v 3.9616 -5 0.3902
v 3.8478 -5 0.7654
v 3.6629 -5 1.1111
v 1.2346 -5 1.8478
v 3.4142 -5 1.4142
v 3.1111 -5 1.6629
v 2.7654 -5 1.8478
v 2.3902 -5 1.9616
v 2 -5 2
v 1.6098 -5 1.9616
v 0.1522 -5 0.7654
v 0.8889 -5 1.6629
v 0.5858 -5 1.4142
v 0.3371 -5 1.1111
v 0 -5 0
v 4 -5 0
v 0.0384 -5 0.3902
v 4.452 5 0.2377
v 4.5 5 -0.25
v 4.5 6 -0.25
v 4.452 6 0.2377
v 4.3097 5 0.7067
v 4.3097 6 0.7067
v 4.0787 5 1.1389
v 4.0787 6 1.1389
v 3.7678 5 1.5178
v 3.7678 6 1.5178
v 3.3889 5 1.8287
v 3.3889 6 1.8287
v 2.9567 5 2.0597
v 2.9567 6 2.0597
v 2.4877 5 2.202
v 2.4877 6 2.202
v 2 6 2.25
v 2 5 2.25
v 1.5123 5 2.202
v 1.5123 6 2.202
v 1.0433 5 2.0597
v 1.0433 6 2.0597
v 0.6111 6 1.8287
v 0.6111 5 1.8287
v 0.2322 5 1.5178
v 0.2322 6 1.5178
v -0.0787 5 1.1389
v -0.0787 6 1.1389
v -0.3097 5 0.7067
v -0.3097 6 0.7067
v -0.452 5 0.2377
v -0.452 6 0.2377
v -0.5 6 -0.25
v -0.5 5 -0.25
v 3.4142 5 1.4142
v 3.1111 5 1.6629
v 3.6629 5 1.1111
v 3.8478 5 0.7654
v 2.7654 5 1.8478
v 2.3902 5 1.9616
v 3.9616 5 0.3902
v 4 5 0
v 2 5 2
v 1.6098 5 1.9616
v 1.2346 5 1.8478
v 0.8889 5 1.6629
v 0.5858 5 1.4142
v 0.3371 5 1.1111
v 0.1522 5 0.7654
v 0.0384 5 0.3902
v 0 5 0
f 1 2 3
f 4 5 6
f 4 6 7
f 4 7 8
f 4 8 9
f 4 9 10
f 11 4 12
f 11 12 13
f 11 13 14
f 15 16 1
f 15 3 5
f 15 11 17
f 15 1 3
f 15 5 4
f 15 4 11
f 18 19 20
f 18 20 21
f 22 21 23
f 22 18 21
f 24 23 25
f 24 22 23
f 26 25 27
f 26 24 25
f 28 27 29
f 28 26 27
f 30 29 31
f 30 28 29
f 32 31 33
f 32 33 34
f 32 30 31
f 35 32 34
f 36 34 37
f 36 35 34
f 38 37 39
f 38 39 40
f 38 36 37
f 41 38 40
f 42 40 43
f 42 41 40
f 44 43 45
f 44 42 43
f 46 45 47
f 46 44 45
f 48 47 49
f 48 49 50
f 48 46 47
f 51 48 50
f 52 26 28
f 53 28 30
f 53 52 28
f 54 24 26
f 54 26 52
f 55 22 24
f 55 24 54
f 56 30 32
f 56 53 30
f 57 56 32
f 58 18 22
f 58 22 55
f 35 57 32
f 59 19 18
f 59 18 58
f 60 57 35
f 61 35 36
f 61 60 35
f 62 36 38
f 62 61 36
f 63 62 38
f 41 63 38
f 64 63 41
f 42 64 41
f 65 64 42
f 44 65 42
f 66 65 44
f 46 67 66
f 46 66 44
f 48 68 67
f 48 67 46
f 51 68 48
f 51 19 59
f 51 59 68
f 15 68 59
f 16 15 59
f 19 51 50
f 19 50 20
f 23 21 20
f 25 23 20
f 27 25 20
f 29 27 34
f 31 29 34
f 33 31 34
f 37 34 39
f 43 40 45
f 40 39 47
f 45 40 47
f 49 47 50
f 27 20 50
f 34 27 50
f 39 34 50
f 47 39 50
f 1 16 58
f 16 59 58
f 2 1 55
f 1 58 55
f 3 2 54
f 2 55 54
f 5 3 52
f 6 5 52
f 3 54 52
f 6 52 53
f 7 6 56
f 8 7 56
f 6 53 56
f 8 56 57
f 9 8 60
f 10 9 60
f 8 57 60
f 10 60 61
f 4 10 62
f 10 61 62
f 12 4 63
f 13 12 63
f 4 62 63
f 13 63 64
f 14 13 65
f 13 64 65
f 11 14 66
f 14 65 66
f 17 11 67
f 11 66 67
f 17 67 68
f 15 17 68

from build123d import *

# Parameters (mm, degrees)
EXTRUDE_1_DEPTH = 5
EXTRUDE_2_DEPTH = 1


with BuildPart() as part:
    # 草图1 → 凸台-拉伸1 (new, symmetric)
    with BuildSketch(Plane(origin=(0, 0, 0), x_dir=(1, 0, 0), z_dir=(0, 1, 0))):
        with BuildLine():
            Line((0, 0), (4, 0))
            ThreePointArc((4, 0), (2, -2), (0, 0))
        make_face()
    extrude(amount=EXTRUDE_1_DEPTH, both=True)

    # 草图2 → 凸台-拉伸2 (add)
    with BuildSketch(Plane(origin=(0, 5, 0), x_dir=(1, 0, 0), z_dir=(0, 1, 0))):
        with BuildLine():
            Line((-0.5, 0.25), (4.5, 0.25))
            ThreePointArc((4.5, 0.25), (2, -2.25), (-0.5, 0.25))
        make_face()
    extrude(amount=EXTRUDE_2_DEPTH)


solid = part.part
